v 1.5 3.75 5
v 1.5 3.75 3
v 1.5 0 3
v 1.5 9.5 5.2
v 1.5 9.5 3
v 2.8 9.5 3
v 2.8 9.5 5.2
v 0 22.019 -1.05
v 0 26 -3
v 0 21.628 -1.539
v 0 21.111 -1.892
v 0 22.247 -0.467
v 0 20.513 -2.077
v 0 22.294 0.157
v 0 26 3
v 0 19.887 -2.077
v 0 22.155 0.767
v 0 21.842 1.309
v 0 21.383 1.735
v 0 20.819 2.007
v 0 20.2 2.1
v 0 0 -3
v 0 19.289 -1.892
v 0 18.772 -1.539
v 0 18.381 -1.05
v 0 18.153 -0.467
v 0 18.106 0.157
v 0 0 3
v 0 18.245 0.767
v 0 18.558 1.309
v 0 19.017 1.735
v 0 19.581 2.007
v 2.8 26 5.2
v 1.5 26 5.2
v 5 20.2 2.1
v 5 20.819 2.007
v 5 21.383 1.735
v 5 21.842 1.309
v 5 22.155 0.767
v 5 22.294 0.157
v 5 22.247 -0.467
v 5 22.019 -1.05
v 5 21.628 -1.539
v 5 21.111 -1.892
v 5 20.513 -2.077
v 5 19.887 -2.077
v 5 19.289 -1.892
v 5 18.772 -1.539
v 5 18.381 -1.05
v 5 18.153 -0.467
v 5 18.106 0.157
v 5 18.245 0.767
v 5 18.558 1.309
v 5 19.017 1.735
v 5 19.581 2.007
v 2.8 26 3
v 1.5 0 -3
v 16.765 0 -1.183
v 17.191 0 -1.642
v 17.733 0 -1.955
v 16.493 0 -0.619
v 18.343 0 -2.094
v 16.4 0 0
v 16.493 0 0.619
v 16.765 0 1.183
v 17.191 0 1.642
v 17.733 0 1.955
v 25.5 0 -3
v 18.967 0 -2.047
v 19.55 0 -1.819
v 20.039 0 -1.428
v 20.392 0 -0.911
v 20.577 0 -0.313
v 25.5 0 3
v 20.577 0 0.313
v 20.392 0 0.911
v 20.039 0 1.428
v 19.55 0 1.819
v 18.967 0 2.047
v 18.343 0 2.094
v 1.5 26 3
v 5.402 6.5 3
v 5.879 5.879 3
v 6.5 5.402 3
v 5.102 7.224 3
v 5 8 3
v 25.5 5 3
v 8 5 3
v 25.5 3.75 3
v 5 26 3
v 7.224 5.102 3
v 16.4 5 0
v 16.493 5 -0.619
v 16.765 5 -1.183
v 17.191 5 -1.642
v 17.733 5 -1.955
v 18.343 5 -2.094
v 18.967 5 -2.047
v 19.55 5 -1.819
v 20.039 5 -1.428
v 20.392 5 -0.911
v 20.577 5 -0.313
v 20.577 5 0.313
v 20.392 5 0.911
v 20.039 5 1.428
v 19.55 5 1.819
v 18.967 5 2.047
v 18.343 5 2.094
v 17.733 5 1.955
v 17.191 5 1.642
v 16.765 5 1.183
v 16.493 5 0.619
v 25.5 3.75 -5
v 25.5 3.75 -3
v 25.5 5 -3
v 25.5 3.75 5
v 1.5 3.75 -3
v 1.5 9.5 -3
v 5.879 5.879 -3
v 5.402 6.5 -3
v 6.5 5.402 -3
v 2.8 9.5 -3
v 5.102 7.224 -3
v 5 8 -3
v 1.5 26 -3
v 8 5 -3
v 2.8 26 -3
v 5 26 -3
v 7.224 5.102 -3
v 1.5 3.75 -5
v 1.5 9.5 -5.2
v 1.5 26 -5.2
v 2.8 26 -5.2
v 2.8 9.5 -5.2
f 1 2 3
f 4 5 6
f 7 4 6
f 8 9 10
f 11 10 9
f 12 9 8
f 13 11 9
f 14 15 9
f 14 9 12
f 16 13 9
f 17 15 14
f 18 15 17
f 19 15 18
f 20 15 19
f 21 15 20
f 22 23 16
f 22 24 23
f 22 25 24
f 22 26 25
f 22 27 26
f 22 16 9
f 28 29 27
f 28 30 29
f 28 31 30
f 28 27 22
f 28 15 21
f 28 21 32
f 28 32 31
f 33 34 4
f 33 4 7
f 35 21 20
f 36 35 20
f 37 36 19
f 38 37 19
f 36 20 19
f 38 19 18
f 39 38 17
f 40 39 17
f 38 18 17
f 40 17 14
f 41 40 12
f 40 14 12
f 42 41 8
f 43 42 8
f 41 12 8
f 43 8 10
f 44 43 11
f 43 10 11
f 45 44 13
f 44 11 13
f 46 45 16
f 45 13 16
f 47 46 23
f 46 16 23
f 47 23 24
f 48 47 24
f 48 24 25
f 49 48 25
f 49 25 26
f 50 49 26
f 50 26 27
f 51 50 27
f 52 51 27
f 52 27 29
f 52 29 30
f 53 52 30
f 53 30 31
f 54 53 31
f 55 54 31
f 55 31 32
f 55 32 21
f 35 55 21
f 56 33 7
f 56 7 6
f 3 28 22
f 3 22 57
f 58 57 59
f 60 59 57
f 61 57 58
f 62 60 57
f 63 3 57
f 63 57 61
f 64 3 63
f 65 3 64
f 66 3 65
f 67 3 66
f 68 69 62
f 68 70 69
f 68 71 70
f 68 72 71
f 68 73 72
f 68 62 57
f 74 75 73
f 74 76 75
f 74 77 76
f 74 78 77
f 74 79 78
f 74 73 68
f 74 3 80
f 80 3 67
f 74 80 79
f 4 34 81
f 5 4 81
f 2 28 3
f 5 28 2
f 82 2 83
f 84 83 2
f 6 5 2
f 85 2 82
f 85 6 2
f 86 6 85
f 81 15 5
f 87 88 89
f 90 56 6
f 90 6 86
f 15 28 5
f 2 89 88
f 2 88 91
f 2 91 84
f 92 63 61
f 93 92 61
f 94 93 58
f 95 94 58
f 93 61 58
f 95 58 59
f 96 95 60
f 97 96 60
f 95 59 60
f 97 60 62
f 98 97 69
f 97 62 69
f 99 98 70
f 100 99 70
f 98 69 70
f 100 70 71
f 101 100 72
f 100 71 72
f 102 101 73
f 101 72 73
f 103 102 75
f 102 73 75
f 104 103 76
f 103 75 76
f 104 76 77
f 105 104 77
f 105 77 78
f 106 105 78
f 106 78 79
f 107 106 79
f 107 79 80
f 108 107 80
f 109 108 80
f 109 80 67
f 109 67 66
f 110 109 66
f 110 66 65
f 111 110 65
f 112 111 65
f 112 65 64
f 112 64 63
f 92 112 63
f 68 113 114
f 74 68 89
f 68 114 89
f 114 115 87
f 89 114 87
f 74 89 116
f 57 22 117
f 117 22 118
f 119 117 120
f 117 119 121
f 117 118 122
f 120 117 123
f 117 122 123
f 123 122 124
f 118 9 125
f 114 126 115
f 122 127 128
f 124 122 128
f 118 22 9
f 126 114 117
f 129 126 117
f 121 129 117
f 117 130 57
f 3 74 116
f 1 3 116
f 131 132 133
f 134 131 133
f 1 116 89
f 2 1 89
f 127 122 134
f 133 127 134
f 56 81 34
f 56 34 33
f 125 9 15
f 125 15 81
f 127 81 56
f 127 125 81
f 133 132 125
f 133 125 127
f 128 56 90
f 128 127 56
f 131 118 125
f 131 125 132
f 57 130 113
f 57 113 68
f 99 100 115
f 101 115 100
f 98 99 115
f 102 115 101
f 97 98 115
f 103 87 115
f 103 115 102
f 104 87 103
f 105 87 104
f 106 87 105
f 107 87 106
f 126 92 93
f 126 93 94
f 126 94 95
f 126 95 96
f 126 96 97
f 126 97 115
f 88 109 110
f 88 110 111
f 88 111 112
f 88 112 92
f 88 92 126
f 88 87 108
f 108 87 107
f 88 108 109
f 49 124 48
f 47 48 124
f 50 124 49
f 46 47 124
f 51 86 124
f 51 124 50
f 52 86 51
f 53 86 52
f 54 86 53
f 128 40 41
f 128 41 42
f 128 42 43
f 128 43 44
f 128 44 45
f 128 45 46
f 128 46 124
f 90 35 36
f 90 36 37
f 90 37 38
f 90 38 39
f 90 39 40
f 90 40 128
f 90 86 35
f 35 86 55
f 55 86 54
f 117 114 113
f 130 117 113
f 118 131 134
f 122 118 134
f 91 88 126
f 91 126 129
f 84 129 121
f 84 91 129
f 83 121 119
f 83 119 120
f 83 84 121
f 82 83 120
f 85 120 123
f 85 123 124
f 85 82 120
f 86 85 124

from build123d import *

# Parameters (mm, degrees)
BOSS_EXTRUDE1_DEPTH   = 3
BOSS_EXTRUDE2_DEPTH   = 24
SKETCH3_W             = 1.3
SKETCH3_H             = 10.4
BOSS_EXTRUDE3_DEPTH   = 16.5
M5X0_8_TAPPED_HOLE1_D = 4.2
M5X0_8_TAPPED_HOLE2_D = 4.2


with BuildPart() as part:
    # Sketch1 → Boss-Extrude1 (new body, symmetric)
    with BuildSketch(Plane.XY):
        with BuildLine():
            Line((0, 26), (0, 0))
            Line((0, 0), (25.5, 0))
            Line((25.5, 0), (25.5, 5))
            Line((25.5, 5), (8, 5))
            ThreePointArc((8, 5), (5.878679656, 5.878679656), (5, 8))
            Line((5, 8), (5, 26))
            Line((5, 26), (0, 26))
        make_face()
    extrude(amount=BOSS_EXTRUDE1_DEPTH, both=True)

    # Sketch2 → Boss-Extrude2 (add)
    with BuildSketch(Plane(origin=(25.5, 0, 0), x_dir=(0, 0, -1), z_dir=(1, 0, 0))):
        Polygon((-3, 0), (-5, 3.75), (5, 3.75), (3, 0), align=None)
    extrude(amount=-BOSS_EXTRUDE2_DEPTH)

    # Sketch3 → Boss-Extrude3 (add)
    with BuildSketch(Plane(origin=(0, 26, 0), x_dir=(1, 0, 0), z_dir=(0, 1, 0))):
        with Locations((2.15, 0)):
            Rectangle(SKETCH3_W, SKETCH3_H)
    extrude(amount=-BOSS_EXTRUDE3_DEPTH)

    # M5x0.8 Tapped Hole1 (through all)
    with Locations(Plane(origin=(0, 5, 0), x_dir=(1, 0, 0), z_dir=(0, 1, 0))):
        with Locations((18.5, 0)):
            Hole(M5X0_8_TAPPED_HOLE1_D / 2)

    # M5x0.8 Tapped Hole2 (through all)
    with Locations(Plane(origin=(5, 0, 0), x_dir=(0, 0, -1), z_dir=(1, 0, 0))):
        with Locations((0, 20.2)):
            Hole(M5X0_8_TAPPED_HOLE2_D / 2)


solid = part.part
